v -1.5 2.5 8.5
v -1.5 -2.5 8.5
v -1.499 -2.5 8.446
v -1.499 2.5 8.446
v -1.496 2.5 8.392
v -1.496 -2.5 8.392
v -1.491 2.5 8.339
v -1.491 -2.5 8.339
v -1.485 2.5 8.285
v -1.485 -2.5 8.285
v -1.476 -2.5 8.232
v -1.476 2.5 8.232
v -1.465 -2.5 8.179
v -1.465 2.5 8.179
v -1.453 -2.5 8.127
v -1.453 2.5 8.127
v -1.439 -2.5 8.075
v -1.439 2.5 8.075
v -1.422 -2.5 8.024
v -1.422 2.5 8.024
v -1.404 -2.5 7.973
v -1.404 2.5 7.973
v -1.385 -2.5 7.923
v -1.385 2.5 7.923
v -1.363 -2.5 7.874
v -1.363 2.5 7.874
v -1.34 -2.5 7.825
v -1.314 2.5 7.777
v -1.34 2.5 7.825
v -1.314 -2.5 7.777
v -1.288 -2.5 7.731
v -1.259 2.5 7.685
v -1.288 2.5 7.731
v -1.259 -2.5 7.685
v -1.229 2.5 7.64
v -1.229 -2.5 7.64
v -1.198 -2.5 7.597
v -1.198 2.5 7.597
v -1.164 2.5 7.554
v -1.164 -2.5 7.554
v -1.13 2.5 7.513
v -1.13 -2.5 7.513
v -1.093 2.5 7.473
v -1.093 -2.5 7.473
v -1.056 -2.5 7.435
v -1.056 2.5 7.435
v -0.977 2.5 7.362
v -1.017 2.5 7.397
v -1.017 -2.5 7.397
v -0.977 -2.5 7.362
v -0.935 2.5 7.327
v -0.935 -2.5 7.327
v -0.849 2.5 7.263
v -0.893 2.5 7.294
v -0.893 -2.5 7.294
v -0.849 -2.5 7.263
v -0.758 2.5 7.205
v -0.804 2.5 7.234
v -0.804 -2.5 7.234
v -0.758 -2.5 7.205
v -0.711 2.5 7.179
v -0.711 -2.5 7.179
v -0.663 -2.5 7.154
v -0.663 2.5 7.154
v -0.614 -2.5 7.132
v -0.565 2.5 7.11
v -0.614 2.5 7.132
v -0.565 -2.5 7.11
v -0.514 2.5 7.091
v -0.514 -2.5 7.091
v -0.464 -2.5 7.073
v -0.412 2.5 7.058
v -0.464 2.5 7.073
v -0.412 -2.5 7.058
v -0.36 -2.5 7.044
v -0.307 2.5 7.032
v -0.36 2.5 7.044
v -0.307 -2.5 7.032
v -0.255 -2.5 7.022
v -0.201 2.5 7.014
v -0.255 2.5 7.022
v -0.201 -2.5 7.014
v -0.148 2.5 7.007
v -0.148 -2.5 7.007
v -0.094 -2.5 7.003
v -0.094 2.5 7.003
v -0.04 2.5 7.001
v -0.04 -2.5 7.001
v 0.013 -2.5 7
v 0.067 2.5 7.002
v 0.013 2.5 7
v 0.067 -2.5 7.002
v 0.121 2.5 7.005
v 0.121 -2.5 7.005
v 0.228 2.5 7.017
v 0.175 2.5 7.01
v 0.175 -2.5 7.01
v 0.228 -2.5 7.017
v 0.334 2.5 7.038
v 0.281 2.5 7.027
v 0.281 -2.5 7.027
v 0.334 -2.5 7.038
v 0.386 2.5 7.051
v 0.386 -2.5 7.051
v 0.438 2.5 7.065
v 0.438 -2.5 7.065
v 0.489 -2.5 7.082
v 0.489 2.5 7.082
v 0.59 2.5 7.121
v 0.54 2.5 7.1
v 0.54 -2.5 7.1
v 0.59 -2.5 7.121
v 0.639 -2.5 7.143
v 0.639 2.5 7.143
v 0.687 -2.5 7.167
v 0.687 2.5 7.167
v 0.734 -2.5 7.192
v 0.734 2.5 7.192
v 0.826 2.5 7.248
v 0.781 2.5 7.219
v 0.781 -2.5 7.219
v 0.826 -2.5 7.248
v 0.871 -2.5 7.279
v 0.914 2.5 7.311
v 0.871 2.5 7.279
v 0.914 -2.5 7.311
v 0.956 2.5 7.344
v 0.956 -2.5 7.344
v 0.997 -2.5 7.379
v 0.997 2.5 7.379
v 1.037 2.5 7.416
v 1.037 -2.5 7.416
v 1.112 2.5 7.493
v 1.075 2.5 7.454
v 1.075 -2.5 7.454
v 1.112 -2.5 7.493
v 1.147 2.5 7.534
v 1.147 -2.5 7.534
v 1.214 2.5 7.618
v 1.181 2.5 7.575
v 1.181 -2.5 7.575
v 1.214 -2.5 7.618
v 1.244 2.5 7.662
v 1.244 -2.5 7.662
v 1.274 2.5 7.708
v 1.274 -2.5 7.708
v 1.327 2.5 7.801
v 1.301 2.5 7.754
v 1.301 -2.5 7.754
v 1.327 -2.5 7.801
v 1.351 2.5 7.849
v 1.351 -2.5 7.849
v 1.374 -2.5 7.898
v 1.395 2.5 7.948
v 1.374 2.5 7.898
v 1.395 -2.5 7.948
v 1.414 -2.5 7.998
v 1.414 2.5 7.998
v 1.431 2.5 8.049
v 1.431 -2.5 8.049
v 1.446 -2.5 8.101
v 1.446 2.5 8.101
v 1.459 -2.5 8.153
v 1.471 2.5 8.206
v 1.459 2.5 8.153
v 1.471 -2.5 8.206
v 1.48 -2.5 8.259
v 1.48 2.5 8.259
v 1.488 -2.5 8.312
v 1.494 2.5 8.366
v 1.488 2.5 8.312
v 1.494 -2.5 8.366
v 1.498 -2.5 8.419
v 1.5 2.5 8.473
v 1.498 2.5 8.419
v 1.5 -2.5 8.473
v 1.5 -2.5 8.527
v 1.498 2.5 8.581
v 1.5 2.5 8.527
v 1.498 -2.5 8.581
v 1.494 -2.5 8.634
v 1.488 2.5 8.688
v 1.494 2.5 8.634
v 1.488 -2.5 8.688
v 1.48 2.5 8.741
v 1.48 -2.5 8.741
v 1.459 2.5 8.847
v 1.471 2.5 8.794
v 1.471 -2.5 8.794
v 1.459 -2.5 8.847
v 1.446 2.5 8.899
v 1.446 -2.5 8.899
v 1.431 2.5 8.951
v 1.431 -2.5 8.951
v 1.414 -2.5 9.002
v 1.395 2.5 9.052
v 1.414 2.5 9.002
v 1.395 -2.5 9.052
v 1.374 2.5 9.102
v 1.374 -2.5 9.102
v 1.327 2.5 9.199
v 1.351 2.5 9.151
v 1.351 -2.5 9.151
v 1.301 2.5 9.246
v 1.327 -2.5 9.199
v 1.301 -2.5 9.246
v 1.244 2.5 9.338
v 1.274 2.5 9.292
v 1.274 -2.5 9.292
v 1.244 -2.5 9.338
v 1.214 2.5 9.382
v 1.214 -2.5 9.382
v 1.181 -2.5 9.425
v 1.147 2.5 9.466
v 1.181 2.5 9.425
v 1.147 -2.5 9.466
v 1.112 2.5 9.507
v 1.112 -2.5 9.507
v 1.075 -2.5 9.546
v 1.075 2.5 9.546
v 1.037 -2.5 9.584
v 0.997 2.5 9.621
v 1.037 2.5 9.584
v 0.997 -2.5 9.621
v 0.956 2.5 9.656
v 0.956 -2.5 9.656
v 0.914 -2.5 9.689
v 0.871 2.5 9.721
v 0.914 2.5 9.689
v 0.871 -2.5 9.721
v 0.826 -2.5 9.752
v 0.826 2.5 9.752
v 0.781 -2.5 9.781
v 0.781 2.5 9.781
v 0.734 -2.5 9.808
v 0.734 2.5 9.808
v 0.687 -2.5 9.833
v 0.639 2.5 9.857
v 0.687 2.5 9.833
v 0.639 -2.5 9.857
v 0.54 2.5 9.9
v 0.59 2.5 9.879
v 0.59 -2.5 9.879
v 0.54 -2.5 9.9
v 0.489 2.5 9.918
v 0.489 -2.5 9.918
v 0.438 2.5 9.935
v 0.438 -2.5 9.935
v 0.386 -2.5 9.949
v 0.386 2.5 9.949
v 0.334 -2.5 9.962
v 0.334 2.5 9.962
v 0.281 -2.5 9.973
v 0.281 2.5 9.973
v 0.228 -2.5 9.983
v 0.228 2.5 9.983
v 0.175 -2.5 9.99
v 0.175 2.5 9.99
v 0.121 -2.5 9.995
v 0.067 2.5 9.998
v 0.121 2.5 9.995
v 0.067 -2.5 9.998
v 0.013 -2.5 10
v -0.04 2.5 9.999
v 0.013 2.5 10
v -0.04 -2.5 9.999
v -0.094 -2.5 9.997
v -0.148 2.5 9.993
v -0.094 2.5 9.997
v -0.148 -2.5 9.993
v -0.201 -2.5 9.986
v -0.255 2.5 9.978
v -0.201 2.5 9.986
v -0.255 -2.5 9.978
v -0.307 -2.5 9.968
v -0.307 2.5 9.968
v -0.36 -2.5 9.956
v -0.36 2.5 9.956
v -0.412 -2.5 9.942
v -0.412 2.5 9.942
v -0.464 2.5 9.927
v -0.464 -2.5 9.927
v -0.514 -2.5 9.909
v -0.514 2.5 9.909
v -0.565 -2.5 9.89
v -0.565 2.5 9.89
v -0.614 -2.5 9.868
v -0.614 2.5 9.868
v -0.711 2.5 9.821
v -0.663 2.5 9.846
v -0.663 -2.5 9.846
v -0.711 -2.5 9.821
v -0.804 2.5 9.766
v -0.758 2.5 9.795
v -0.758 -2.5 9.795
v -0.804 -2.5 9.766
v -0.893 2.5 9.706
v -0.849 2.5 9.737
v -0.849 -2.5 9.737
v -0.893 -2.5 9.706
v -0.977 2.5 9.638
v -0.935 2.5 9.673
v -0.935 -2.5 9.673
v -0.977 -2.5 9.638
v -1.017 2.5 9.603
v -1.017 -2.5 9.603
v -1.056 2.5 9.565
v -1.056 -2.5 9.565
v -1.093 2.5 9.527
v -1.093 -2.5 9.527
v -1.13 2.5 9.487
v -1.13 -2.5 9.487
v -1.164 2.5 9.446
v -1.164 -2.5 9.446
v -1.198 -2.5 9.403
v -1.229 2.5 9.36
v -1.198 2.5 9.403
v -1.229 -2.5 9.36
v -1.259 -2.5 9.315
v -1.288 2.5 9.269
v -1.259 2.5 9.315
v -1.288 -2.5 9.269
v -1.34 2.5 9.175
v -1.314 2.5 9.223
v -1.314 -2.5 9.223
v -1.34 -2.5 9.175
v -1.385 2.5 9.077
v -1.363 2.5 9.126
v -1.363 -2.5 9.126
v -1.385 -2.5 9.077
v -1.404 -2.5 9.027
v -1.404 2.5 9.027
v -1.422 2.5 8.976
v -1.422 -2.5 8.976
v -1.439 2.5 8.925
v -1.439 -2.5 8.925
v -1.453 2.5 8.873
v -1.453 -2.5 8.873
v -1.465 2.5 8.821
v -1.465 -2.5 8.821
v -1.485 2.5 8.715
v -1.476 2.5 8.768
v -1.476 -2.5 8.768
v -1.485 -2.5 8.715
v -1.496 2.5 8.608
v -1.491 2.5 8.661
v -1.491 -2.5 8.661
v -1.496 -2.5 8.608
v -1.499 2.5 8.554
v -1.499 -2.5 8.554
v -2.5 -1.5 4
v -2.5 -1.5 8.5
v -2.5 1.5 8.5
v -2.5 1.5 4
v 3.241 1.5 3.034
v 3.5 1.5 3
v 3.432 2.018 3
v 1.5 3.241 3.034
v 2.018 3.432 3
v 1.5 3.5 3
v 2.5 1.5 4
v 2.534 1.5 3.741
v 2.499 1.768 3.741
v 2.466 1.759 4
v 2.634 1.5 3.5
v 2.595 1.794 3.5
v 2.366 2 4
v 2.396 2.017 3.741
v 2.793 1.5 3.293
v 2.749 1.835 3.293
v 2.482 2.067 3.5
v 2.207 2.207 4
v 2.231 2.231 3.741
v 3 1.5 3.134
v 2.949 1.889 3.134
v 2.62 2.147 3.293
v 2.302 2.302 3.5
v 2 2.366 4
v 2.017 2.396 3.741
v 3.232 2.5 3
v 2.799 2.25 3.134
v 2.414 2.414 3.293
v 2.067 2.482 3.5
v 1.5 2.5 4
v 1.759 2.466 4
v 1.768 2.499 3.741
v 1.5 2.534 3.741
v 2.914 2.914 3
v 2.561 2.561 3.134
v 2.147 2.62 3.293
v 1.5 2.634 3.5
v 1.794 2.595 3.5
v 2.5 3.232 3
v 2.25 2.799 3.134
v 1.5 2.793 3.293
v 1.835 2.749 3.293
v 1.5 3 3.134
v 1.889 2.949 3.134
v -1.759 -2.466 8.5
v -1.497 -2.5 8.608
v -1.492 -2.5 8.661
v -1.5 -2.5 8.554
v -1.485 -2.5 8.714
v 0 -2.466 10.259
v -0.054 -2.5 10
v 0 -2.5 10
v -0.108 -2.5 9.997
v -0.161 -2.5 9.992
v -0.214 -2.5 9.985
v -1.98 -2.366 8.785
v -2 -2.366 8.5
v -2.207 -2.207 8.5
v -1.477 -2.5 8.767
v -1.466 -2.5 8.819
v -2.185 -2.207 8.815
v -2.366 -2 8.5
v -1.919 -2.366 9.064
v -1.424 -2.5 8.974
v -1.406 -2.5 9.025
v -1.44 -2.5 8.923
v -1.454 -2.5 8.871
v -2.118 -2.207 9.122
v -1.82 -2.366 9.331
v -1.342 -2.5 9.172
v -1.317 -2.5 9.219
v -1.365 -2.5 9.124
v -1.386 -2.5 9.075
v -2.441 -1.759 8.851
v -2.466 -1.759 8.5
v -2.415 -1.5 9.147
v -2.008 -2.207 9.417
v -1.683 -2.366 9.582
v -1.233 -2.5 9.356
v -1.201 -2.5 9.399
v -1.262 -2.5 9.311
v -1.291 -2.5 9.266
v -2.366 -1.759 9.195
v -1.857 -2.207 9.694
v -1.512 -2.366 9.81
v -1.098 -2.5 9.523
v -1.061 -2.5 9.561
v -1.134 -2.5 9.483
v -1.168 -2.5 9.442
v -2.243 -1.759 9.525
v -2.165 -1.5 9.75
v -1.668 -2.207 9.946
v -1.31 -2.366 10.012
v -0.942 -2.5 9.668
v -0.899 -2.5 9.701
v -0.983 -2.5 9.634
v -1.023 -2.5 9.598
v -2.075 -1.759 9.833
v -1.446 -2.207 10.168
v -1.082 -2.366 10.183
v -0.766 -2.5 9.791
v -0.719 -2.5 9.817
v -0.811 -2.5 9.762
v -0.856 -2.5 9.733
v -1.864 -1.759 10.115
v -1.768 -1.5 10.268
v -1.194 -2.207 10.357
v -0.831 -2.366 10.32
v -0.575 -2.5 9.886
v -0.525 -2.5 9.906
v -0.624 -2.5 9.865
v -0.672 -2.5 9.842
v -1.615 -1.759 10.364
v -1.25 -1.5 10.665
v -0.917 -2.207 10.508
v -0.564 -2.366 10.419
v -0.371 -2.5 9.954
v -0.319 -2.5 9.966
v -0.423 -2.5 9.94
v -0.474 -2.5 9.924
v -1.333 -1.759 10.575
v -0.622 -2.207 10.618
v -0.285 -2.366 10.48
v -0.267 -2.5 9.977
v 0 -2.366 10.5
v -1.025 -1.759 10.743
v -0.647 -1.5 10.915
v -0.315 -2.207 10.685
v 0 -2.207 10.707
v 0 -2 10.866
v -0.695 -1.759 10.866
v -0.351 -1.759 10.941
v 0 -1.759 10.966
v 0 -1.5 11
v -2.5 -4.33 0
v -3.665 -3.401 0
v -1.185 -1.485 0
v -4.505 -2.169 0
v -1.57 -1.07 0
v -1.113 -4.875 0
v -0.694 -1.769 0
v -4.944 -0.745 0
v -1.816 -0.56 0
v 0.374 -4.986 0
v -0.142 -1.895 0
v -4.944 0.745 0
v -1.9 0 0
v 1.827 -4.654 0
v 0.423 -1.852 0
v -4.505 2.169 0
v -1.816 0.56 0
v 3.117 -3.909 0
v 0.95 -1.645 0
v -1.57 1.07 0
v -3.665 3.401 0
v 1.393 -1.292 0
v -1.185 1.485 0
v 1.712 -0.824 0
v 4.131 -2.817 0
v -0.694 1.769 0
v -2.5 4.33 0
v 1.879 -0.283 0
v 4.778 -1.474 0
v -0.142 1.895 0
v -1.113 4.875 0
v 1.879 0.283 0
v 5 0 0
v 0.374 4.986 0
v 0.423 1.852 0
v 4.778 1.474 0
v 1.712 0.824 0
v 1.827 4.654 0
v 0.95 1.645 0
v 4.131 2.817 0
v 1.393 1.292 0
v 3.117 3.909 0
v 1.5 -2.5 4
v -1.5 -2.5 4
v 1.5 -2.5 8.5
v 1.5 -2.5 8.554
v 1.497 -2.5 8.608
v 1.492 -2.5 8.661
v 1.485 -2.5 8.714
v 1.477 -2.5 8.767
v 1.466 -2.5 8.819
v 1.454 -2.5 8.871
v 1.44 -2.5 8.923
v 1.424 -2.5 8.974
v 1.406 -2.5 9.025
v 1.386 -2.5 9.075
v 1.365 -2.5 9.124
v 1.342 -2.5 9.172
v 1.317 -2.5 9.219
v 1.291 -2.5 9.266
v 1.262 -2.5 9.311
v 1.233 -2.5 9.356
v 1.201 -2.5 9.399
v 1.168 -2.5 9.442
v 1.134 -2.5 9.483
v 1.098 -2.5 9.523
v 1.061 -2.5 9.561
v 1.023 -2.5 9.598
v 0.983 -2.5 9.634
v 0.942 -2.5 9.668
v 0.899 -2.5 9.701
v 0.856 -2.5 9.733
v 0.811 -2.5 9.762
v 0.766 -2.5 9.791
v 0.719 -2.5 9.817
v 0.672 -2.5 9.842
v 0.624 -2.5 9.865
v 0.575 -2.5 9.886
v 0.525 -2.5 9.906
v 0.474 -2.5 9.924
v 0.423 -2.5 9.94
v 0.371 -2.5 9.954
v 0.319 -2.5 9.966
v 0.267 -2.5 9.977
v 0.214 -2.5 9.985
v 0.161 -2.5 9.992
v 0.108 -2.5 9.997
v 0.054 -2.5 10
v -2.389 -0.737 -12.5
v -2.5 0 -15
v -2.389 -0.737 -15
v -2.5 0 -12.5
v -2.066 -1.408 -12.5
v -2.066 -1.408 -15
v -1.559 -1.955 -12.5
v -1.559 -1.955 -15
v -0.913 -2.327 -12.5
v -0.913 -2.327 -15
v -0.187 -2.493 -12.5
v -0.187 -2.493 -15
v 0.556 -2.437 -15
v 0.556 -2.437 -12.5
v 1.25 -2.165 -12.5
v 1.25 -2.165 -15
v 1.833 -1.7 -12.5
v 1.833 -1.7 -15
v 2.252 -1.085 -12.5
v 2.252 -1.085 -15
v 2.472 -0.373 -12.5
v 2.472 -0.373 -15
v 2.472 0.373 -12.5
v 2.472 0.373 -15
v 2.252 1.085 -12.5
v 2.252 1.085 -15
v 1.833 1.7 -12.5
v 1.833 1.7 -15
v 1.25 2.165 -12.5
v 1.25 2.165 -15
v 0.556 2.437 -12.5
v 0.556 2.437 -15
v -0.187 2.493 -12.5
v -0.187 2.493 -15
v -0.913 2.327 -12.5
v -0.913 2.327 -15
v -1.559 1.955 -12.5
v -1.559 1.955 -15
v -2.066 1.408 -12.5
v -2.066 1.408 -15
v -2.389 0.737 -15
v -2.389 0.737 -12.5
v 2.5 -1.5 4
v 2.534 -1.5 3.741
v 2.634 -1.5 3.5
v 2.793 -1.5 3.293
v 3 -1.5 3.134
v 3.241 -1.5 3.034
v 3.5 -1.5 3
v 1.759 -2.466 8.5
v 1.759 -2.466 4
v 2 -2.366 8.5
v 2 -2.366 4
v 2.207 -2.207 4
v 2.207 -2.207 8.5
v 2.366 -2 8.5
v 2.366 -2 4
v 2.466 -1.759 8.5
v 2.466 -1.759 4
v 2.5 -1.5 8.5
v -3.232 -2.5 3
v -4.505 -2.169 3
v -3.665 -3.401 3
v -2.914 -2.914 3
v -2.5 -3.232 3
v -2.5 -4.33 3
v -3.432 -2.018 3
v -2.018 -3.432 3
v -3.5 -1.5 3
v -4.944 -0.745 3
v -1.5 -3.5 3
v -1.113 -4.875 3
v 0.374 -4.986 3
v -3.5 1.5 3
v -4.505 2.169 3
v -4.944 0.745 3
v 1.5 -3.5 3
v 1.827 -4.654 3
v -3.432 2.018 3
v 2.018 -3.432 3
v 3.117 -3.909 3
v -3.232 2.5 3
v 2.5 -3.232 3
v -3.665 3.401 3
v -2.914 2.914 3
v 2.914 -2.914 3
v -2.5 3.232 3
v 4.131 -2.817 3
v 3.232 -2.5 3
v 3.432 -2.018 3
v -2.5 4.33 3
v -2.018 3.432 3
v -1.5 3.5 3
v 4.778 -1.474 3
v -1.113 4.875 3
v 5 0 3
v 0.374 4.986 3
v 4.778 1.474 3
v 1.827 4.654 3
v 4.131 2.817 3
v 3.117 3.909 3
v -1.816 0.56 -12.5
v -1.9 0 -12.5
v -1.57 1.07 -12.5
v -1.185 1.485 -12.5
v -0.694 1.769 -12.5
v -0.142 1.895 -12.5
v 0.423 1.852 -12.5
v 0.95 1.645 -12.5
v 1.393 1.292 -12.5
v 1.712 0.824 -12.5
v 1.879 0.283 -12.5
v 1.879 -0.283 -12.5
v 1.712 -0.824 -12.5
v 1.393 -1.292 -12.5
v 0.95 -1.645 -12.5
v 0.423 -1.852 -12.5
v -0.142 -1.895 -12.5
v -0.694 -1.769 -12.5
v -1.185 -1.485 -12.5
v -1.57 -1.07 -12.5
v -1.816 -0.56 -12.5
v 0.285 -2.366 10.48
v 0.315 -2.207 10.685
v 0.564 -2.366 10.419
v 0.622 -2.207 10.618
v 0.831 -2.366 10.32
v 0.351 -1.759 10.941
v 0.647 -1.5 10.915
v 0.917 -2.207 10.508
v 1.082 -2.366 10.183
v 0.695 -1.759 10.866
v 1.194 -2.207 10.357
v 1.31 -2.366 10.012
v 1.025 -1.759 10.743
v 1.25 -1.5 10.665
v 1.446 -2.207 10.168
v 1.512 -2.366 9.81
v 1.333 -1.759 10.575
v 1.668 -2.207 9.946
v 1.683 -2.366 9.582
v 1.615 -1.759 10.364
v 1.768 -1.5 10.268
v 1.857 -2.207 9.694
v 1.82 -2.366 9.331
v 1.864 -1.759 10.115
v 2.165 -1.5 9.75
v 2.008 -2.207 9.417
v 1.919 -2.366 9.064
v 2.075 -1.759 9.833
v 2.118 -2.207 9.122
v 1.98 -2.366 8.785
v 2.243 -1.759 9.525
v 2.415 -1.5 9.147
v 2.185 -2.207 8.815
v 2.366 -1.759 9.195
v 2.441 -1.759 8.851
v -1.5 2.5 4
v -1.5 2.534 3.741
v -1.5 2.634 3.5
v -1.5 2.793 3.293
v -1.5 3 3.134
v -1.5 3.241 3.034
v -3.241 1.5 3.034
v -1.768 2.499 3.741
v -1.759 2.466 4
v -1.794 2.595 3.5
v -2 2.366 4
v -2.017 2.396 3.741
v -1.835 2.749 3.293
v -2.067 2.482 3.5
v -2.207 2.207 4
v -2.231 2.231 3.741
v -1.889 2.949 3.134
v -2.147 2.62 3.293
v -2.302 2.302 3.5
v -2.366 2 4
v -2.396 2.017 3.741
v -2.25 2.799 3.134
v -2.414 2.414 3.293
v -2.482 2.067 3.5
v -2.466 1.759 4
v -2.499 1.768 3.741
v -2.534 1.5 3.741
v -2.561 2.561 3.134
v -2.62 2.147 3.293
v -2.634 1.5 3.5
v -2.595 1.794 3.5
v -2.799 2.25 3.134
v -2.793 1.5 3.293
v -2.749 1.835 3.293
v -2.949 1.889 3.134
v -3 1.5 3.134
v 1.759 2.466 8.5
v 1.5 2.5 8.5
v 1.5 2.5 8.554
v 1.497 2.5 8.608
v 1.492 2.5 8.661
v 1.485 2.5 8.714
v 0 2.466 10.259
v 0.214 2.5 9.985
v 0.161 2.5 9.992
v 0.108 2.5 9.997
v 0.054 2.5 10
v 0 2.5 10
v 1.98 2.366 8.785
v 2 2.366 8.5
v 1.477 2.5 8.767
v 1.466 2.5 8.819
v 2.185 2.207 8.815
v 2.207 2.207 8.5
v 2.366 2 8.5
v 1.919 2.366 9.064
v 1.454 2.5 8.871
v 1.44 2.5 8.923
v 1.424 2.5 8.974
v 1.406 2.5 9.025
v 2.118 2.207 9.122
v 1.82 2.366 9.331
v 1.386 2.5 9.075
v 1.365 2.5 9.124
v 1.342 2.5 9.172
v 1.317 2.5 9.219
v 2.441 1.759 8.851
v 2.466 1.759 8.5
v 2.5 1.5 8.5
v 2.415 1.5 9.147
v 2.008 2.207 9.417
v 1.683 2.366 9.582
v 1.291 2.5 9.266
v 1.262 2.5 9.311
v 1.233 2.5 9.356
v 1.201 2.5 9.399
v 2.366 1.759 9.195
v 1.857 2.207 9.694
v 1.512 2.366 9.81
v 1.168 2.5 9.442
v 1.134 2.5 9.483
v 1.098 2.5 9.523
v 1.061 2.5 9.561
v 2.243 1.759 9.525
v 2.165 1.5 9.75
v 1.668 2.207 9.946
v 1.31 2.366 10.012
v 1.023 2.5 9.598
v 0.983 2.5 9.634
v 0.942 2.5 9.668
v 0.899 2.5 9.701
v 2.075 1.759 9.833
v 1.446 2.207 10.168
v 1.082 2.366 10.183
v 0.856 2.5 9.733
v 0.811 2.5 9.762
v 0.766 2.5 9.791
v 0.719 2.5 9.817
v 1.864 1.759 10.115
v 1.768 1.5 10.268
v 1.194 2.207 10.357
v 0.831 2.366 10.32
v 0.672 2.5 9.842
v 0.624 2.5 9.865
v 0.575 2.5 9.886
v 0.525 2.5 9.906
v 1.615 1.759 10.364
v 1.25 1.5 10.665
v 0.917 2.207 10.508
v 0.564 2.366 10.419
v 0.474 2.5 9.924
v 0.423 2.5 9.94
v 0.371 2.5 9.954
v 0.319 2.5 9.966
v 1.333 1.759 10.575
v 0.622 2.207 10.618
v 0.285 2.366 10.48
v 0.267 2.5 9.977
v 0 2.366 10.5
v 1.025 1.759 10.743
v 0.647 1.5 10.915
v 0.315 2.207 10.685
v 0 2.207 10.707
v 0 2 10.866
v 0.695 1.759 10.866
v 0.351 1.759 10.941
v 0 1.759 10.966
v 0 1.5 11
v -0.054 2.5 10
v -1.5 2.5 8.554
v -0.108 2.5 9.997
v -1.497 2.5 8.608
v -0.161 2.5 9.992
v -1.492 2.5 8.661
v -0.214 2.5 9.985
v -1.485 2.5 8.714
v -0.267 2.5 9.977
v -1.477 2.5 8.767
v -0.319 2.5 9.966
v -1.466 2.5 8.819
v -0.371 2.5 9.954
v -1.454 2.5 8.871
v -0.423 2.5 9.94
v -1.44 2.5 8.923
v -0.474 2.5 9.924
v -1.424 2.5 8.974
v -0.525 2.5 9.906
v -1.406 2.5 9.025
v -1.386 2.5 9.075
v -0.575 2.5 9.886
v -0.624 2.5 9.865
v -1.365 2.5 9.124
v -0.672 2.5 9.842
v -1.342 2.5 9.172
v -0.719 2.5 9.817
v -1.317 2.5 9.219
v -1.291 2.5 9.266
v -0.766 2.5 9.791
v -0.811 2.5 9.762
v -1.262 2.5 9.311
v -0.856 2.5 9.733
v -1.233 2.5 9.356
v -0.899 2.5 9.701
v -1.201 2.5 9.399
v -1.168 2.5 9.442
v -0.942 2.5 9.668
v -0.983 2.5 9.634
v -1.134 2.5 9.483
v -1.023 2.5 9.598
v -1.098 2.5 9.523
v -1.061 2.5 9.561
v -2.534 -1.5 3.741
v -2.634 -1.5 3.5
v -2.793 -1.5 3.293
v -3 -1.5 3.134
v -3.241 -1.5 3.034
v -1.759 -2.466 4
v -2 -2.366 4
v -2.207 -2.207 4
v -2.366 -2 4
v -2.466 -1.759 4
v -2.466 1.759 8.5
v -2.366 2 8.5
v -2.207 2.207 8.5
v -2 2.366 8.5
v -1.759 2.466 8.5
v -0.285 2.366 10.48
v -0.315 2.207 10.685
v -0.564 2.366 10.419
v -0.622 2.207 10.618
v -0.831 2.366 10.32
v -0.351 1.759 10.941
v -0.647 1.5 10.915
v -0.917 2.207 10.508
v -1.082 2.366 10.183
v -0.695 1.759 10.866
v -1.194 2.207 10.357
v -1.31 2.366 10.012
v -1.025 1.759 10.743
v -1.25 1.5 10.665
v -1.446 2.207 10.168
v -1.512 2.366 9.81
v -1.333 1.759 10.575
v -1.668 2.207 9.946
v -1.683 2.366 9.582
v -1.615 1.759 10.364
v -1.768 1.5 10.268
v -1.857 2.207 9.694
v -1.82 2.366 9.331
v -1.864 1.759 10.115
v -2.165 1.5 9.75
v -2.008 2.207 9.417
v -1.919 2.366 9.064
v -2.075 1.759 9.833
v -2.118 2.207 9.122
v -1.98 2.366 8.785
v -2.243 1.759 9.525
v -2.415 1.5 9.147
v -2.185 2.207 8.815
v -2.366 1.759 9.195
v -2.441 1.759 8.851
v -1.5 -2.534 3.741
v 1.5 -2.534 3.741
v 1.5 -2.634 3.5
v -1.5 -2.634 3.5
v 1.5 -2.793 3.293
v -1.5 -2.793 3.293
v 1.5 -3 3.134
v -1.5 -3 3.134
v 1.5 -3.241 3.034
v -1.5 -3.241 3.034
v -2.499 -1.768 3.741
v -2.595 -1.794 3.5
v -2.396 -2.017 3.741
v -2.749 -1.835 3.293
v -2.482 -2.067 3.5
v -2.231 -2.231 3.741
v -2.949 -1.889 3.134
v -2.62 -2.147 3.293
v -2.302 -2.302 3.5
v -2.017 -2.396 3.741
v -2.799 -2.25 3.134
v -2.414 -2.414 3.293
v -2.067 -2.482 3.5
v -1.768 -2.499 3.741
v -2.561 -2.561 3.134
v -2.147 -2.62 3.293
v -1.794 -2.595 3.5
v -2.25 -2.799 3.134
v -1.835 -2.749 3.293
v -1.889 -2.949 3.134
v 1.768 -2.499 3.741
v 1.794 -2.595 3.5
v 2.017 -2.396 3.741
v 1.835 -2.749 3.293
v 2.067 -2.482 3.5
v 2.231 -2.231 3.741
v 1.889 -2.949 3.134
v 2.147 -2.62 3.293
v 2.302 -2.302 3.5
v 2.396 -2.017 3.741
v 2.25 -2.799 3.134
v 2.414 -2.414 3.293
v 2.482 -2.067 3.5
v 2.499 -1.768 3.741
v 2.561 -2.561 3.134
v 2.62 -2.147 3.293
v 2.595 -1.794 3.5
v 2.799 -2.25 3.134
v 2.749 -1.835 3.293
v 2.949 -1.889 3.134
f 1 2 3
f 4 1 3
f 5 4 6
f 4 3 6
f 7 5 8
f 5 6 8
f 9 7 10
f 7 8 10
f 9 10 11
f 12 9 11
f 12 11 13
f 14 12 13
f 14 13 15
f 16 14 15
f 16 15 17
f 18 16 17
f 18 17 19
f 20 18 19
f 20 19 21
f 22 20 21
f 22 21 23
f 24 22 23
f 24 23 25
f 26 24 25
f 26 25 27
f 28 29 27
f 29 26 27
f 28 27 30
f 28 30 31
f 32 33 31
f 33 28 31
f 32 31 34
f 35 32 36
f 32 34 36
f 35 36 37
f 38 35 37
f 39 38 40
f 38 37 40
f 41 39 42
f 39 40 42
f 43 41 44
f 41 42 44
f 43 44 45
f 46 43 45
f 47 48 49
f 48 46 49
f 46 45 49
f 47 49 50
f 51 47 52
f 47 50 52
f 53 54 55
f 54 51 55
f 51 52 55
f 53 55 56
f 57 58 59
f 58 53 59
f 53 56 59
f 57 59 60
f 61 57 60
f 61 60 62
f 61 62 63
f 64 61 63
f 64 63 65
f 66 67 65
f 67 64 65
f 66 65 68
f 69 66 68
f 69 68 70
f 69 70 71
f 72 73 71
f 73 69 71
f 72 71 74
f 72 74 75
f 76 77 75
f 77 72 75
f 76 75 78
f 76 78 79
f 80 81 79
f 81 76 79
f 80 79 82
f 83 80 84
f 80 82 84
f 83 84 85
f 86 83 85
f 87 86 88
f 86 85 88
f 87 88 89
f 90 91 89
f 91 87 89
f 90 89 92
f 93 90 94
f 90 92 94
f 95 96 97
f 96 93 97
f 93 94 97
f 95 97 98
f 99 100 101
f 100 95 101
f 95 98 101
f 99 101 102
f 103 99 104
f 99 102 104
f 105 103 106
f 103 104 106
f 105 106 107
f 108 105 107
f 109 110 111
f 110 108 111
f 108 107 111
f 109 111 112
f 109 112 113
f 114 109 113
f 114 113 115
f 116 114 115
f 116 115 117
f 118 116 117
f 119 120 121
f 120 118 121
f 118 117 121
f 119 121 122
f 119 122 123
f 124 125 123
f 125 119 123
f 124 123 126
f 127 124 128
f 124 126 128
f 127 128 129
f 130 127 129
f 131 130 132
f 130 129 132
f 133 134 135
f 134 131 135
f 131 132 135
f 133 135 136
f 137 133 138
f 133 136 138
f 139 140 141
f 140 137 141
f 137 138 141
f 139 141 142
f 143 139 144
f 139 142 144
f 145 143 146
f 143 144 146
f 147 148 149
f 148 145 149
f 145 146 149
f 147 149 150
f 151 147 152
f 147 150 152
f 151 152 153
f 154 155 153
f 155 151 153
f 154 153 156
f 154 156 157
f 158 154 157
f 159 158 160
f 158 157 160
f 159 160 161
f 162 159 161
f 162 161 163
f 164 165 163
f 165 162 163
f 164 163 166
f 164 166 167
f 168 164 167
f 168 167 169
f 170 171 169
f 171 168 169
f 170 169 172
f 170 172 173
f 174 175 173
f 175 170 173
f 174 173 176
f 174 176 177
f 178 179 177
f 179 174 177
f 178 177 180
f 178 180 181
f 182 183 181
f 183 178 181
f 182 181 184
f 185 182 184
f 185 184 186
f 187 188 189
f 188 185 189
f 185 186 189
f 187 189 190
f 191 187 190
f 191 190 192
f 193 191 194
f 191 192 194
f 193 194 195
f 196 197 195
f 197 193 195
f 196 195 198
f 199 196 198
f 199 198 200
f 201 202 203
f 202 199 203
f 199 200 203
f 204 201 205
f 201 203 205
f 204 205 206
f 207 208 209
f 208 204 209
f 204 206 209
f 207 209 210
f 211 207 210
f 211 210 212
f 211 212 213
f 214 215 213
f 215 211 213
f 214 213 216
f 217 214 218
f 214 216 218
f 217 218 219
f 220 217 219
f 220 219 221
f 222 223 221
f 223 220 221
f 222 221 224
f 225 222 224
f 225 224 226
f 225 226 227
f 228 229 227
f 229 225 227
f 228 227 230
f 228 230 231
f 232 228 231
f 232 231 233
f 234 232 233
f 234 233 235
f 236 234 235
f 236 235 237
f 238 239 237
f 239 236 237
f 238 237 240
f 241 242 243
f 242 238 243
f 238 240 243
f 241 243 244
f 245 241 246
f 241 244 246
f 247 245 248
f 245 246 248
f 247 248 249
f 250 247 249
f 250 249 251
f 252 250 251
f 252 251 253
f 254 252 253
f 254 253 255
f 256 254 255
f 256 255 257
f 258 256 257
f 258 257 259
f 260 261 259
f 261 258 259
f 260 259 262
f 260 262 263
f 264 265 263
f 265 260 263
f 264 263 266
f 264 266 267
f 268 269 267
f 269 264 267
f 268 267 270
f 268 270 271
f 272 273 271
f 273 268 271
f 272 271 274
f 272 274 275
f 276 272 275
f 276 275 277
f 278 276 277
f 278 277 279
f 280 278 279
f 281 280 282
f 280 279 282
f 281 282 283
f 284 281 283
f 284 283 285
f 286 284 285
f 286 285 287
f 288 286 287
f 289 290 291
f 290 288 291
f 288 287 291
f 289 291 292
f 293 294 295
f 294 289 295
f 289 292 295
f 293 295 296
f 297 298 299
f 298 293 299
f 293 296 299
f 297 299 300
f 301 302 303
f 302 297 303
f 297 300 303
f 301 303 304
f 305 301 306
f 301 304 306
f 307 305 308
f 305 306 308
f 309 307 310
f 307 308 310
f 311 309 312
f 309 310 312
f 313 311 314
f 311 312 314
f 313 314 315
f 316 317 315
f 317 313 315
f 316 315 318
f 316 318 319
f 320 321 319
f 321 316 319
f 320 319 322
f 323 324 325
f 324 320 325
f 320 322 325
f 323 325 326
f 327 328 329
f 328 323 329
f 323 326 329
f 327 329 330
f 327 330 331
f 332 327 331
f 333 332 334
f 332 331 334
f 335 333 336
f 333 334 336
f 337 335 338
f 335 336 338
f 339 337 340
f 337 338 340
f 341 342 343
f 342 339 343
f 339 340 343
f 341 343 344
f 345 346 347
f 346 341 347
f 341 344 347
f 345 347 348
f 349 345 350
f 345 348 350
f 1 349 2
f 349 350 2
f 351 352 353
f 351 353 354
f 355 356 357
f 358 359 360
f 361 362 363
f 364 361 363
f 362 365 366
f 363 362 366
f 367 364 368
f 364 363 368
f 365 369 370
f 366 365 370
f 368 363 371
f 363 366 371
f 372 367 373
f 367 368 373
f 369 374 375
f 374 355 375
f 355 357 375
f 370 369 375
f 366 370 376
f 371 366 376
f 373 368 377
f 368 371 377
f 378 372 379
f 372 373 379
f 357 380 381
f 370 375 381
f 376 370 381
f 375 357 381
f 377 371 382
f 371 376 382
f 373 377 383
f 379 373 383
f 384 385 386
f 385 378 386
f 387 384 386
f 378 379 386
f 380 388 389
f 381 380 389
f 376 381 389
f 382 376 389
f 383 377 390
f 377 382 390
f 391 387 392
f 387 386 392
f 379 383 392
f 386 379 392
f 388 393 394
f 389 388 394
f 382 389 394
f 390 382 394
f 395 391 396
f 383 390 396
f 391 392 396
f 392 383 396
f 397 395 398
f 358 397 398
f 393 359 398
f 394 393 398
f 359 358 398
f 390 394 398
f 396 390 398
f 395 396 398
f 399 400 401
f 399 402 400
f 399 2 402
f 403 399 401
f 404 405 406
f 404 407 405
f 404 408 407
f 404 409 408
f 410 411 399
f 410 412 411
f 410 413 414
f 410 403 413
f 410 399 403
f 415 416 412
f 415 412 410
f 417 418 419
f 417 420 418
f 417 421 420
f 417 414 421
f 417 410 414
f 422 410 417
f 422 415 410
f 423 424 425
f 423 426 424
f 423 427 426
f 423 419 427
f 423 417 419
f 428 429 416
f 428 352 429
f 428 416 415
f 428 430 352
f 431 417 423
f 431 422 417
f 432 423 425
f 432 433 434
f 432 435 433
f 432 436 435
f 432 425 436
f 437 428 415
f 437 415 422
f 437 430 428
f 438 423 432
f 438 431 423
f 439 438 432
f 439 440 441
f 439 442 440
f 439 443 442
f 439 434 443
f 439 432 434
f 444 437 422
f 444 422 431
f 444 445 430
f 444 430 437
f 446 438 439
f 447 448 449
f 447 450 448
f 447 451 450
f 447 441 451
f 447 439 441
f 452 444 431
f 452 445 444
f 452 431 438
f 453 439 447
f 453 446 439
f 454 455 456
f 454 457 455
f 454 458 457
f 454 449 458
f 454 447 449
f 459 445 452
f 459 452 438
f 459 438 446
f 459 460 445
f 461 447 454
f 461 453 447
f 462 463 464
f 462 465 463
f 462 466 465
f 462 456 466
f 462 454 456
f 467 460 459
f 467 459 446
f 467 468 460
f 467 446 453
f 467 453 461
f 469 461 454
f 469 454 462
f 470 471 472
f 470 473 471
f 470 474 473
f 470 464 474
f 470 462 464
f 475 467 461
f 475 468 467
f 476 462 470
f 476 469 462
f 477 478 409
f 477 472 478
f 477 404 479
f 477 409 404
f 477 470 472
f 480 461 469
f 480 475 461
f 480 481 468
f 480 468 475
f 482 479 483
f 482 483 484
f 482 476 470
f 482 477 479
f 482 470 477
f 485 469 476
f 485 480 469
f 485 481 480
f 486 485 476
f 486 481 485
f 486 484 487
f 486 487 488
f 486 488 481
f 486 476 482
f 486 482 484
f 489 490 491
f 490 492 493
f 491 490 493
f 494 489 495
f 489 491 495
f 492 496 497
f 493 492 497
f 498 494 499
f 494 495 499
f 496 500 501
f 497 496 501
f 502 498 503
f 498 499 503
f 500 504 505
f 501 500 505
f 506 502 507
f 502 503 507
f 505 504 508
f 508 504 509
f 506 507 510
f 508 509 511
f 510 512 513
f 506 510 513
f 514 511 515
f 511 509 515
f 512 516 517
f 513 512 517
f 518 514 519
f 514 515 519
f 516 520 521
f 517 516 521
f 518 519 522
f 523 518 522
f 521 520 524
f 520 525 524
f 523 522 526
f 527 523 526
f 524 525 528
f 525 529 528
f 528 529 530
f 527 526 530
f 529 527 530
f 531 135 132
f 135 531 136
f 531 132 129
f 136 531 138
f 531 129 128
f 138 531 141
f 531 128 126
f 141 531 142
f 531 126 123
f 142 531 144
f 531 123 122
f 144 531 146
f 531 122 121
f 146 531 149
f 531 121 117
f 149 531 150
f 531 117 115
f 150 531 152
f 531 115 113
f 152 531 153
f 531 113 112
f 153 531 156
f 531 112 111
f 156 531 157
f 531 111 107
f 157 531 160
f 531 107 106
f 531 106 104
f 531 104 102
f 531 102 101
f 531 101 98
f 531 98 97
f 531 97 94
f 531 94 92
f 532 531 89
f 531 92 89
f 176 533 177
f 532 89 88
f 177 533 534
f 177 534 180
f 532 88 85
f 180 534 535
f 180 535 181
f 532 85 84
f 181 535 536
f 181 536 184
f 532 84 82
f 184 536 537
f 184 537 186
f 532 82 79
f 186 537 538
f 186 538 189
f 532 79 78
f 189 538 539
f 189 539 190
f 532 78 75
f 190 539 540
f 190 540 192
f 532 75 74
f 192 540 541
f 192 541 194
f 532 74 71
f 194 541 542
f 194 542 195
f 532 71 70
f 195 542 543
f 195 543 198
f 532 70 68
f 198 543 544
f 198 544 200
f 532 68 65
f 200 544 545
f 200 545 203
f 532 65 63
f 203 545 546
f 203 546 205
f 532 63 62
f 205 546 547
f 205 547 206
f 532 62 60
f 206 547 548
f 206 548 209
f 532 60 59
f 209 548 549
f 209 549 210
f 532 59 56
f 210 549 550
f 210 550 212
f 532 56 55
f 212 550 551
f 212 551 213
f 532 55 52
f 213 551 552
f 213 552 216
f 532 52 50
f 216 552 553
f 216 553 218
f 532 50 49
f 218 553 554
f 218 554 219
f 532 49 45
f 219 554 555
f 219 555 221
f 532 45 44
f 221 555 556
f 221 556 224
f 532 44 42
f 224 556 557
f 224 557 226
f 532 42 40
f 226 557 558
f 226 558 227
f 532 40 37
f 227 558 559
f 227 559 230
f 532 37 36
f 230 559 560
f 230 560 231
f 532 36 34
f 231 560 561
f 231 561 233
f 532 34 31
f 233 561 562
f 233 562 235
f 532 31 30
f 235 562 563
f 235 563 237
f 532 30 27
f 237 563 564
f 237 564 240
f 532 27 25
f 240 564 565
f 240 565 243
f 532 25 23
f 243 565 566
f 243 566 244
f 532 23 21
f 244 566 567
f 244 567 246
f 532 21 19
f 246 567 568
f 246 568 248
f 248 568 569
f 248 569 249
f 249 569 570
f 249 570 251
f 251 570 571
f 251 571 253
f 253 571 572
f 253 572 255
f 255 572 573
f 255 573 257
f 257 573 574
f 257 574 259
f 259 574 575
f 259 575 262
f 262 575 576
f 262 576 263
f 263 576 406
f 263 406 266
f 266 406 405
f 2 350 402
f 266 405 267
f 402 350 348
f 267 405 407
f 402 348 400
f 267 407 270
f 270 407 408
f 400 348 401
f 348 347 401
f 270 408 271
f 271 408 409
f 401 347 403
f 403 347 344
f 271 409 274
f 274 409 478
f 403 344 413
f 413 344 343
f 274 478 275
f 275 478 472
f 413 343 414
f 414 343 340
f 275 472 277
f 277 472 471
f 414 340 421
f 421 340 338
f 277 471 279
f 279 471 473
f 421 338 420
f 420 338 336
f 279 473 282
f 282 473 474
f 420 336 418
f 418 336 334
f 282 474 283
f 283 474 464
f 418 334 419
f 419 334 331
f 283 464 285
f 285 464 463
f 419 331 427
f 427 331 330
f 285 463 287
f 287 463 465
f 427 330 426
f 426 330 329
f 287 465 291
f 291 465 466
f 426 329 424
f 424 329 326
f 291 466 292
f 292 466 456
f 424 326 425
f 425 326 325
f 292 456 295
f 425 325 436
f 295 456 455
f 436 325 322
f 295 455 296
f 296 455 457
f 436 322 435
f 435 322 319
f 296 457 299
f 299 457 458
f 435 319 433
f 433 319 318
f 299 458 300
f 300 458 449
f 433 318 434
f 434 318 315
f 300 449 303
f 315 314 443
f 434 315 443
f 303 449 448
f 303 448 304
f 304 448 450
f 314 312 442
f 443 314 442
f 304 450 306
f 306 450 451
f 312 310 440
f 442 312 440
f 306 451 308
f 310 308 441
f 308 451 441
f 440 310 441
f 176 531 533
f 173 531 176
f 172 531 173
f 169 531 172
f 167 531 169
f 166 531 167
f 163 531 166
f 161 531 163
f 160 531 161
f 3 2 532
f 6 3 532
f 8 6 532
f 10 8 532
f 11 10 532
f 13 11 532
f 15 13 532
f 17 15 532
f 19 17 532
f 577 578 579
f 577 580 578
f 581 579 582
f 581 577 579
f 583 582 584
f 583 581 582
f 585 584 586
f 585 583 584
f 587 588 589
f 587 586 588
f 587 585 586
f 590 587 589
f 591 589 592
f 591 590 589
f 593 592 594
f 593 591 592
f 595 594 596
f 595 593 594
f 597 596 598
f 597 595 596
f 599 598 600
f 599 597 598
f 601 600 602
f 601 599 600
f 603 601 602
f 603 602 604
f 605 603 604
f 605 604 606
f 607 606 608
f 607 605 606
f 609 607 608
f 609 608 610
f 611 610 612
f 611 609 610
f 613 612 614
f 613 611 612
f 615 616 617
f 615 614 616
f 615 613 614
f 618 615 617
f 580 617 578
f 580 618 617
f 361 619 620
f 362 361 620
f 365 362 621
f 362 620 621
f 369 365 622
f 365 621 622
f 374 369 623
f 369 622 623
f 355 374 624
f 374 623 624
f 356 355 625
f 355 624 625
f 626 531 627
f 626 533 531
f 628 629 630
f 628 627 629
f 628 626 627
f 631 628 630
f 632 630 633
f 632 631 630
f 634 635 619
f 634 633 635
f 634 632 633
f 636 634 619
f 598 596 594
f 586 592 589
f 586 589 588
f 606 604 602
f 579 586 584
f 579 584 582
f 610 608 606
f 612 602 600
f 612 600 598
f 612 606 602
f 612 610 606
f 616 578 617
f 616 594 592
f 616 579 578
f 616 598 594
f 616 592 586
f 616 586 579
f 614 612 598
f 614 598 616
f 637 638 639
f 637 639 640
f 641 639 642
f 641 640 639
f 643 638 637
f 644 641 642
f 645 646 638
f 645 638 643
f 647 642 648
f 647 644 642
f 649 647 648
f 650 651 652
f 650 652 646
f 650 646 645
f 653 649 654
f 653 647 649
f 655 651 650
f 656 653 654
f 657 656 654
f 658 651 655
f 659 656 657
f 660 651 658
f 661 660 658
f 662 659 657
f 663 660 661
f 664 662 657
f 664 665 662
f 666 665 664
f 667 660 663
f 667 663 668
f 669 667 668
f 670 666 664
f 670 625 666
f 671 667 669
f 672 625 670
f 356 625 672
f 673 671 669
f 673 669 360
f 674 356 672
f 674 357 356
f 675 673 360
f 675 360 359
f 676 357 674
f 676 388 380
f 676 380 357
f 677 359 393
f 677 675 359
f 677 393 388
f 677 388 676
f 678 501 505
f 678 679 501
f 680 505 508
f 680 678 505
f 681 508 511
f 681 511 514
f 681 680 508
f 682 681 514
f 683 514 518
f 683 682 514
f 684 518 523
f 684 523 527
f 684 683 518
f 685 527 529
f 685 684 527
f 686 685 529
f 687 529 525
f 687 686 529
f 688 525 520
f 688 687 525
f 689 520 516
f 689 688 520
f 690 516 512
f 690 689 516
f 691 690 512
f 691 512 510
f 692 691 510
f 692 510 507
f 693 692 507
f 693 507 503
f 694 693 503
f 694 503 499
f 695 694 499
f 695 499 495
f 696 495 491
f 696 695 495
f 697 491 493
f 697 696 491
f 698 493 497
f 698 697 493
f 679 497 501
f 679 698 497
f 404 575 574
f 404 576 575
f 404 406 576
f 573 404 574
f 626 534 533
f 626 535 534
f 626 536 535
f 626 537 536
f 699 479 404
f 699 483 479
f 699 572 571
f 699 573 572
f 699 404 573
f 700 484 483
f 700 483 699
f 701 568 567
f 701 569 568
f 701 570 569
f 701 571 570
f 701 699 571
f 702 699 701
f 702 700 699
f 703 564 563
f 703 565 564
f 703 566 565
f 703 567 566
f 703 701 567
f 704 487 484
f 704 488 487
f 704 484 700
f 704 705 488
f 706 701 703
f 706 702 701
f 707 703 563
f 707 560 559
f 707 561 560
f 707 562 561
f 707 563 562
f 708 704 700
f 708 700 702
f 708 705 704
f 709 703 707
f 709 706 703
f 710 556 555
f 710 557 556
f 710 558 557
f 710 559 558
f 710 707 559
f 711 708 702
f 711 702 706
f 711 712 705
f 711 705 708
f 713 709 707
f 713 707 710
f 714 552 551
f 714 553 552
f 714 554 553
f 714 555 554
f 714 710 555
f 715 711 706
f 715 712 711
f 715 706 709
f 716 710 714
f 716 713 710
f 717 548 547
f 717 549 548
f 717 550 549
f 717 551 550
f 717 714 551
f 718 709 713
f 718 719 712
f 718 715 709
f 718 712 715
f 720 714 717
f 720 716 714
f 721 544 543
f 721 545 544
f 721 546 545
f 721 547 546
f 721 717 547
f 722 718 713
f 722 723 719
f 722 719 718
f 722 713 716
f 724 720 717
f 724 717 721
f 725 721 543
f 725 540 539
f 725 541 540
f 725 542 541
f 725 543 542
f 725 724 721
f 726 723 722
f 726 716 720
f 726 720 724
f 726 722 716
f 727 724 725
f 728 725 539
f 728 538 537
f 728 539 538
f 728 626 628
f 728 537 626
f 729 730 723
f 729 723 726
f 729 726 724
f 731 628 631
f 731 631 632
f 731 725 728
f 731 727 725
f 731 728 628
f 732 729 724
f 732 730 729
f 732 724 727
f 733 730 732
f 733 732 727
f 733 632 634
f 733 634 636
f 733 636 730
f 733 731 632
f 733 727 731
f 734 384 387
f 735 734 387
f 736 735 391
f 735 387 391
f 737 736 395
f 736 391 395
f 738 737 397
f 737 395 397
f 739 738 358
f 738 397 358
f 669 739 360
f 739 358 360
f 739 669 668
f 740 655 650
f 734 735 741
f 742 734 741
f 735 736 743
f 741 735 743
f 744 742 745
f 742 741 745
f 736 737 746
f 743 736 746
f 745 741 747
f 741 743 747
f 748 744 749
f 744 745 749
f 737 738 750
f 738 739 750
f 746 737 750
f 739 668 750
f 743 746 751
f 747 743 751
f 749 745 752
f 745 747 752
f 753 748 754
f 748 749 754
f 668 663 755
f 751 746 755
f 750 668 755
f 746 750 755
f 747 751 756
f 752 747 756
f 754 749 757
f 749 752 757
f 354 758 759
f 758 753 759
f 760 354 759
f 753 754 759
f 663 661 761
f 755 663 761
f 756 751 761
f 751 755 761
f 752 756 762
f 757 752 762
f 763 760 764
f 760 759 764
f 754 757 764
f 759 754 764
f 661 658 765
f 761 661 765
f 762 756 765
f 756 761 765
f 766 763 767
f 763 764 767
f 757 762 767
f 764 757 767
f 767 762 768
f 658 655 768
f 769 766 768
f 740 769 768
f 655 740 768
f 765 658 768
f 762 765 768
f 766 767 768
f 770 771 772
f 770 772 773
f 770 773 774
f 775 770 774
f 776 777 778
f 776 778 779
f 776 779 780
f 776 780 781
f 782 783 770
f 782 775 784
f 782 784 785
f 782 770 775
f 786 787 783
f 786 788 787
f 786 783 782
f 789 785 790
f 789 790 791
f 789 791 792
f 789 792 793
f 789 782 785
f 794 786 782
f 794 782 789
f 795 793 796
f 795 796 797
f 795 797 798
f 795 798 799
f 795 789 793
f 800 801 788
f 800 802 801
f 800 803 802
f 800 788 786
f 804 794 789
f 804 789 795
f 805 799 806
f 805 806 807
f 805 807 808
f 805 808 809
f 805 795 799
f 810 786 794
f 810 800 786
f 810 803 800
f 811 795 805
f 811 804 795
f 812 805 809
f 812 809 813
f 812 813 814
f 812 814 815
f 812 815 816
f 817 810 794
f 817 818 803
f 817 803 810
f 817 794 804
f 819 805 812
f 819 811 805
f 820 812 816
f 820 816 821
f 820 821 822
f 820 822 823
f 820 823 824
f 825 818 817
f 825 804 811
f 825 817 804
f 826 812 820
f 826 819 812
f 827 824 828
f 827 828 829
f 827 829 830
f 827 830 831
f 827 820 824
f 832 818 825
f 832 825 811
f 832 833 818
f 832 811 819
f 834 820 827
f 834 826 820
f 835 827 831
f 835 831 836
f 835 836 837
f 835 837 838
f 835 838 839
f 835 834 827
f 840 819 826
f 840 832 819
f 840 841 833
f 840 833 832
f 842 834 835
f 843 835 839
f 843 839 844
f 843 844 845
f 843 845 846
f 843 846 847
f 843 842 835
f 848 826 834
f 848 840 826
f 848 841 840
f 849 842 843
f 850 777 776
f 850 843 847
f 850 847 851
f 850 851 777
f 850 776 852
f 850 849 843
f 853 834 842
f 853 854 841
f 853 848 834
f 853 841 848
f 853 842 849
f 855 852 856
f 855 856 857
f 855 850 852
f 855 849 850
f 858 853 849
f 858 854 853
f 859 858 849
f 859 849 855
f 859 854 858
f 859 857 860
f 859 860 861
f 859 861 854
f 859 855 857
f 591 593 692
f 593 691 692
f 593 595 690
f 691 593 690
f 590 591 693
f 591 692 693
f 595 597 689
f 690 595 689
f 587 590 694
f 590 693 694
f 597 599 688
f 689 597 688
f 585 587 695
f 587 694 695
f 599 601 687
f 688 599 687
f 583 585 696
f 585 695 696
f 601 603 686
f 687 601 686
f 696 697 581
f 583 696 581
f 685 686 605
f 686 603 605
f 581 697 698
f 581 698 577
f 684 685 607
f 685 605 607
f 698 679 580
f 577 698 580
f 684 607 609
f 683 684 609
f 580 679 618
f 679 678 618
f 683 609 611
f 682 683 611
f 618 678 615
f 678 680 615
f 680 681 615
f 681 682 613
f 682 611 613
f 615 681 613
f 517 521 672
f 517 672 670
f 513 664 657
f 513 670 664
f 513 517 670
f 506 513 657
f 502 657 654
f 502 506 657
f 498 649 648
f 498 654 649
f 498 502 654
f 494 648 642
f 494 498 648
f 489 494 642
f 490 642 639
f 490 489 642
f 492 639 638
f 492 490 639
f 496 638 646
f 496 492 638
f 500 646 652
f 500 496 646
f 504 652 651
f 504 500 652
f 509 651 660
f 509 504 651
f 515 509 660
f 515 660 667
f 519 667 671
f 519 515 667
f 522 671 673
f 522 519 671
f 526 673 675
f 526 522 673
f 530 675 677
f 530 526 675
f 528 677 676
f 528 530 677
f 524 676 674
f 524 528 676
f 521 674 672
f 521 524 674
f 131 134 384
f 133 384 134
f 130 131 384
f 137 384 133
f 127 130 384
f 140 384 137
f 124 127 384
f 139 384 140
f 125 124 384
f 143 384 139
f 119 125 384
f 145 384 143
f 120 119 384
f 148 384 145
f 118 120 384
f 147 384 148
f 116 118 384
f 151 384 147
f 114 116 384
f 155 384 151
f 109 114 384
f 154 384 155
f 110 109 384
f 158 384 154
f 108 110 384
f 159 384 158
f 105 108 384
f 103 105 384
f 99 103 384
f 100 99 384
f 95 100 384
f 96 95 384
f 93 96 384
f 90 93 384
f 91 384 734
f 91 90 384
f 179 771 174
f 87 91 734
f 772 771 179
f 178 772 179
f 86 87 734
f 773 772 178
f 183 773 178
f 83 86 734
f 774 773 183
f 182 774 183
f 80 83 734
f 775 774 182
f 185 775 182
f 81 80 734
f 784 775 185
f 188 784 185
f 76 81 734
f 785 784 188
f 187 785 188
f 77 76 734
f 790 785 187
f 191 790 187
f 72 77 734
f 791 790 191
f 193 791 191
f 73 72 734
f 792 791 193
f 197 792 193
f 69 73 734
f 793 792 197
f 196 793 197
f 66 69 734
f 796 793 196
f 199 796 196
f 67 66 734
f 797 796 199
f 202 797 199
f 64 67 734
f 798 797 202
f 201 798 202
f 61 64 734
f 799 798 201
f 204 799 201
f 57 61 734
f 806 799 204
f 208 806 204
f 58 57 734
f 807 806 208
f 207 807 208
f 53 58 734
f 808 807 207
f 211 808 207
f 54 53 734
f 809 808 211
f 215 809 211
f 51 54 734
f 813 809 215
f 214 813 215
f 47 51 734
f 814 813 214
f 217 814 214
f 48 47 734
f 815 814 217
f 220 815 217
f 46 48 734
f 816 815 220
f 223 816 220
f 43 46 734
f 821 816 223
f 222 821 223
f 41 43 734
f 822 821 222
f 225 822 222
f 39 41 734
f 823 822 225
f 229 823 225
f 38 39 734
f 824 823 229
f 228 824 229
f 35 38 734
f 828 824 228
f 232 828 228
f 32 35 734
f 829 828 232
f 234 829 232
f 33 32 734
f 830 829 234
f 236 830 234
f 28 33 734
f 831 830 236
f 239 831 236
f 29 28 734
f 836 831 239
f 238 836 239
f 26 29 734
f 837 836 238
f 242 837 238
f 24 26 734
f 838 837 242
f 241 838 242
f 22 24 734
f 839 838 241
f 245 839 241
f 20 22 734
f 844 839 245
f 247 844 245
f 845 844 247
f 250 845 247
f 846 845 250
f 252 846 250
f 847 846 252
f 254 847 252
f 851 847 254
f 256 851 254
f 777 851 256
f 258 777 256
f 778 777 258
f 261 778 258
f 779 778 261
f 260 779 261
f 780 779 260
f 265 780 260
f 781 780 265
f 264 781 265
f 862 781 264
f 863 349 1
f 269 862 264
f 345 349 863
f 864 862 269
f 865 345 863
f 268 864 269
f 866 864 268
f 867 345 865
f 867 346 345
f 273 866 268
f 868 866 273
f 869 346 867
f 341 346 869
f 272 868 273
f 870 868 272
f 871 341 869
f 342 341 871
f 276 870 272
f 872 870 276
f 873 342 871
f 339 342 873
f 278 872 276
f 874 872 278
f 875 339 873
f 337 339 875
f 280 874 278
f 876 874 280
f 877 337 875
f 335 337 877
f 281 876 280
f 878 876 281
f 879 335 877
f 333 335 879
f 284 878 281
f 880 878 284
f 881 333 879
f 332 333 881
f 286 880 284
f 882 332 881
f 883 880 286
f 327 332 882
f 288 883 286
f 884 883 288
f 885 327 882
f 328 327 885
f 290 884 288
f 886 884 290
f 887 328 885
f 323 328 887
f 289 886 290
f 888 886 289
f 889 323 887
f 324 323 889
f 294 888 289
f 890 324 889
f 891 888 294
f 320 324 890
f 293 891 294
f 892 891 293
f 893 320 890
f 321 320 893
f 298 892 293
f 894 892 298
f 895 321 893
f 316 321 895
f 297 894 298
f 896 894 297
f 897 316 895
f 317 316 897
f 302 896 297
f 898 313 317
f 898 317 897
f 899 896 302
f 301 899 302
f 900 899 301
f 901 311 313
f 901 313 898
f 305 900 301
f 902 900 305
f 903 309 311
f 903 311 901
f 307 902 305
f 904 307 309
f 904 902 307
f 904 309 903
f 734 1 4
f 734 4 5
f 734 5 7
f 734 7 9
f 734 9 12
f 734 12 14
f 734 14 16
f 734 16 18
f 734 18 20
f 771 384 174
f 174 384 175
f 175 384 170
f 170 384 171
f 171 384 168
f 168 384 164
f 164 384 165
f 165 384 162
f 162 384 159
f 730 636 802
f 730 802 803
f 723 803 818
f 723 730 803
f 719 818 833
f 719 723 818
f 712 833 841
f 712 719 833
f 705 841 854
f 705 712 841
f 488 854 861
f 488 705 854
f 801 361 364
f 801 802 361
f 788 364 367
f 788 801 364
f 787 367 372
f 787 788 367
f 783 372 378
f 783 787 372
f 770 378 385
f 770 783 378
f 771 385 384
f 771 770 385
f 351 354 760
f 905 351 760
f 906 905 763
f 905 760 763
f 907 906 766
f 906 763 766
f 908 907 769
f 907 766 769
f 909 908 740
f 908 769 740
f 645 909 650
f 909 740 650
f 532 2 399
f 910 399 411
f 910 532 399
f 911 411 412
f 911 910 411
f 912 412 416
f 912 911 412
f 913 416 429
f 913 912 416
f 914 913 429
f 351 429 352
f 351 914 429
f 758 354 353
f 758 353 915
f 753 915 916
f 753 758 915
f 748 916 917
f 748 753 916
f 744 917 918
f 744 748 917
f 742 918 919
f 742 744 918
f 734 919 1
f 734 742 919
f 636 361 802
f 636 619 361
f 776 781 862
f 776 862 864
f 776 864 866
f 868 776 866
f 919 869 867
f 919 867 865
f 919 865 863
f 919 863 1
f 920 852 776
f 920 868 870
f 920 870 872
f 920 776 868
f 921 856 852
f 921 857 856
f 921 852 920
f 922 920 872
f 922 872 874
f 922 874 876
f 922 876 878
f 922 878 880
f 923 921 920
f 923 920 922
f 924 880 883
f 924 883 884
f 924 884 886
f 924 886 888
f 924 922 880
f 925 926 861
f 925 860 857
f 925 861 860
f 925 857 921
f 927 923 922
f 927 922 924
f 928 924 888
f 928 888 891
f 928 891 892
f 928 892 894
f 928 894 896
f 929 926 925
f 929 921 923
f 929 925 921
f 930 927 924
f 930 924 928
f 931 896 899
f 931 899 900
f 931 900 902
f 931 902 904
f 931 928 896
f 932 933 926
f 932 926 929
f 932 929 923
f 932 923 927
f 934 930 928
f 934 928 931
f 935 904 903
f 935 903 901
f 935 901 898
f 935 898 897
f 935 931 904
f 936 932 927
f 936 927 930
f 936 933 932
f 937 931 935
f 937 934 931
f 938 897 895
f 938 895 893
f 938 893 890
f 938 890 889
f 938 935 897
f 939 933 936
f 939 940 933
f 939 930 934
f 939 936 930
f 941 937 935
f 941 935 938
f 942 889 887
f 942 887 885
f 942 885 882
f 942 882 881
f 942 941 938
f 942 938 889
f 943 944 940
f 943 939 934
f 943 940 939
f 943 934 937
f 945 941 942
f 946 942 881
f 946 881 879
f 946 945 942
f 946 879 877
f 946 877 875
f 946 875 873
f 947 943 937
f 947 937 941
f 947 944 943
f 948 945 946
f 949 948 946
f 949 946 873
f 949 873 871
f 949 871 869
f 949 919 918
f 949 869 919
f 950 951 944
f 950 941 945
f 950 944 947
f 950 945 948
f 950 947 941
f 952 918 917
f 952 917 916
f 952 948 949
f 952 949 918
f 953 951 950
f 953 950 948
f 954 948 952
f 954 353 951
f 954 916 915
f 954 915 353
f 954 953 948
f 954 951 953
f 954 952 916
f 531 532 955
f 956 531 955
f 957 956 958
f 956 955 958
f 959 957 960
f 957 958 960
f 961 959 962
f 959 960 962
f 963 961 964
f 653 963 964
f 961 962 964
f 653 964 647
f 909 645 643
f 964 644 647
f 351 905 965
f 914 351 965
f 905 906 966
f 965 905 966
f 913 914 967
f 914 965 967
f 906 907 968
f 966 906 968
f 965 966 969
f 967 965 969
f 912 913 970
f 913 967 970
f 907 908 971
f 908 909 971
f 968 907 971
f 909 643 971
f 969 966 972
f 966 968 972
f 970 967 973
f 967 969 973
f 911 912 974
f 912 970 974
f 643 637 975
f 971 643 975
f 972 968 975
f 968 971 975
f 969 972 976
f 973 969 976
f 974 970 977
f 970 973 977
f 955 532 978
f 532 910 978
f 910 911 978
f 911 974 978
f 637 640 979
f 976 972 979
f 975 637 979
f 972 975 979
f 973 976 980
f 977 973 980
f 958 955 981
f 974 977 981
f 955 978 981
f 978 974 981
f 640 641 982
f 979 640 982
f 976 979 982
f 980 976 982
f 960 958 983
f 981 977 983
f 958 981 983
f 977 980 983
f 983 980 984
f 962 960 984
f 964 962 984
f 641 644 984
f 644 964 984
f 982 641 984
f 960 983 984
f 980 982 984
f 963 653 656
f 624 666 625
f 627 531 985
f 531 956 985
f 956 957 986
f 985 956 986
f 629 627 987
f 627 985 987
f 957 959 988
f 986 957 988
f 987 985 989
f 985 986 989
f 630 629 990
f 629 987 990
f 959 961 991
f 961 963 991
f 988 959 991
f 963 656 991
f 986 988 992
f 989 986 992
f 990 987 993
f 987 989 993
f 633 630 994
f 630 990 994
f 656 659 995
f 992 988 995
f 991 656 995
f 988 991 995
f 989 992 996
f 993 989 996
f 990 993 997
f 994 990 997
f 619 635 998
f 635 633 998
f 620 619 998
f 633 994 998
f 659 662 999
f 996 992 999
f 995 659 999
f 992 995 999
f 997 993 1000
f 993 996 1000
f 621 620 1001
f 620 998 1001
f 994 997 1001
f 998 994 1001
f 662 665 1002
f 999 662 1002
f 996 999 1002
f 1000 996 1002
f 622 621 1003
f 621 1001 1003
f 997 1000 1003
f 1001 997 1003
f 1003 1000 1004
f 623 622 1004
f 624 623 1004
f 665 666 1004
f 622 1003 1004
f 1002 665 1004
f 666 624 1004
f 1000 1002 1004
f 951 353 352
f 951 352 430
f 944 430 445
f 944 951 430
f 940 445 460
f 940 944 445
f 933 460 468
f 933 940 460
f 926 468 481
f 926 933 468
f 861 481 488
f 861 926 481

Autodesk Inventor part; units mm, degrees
ref_plane "YZ Plane" through (0, 0, 0) normal (1, 0, 0) x (0, 1, 0)
sketch "스케치1" plane through (0, 0, 0) normal (0, 0, 1) x (1, 0, 0)
  circle A0 centre (0, 0) radius 5
  dimension "d0" = 10
extrude "돌출1" add sketch "스케치1" along normal blind 3
ref_plane "작업 평면1" through (0, 0, 0) normal (0, 1, 0) x (-1, 0, 0)
sketch "스케치2" plane through (0, 0, 0) normal (0, 1, 0) x (-1, 0, 0)
  line L0 (5, 3) -> (-5, 3) projected
  line L1 (2.5, 3) -> (-2.5, 3)
  line L2 (-2.5, 3) -> (-2.5, 11)
  line L3 (-2.5, 11) -> (2.5, 11)
  line L4 (2.5, 11) -> (2.5, 3)
  circle A0 centre (0, 8.5) radius 1.5
  point P0 (0, 0)
  point P1 (0, 3)
  point P2 (0, 11)
  dimension "d3" = 5
  dimension "d4" = 8
  dimension "d5" = 3
  dimension "d15" = 2.5
extrude "돌출2" add sketch "스케치2" along normal mid plane 5
fillet "모깎기1" radius 2.5 2 edges at (2.5, 0, 11) (-2.5, 0, 11)
fillet "모깎기2" radius 1 6 edges at (1.7679, 2.5, 10.2679) (2.5, 2.5, 5.7503) (-2.5, 2.5, 5.7503) (1.7679, -2.5, 10.2679) (2.5, -2.5, 5.7503) (-2.5, -2.5, 5.7503)
fillet "모깎기3" radius 1 8 edges at (-2.2073, -2.2073, 3) (-2.5, 0, 3) (-2.2073, 2.2073, 3) (0, 2.5, 3) (2.2073, 2.2073, 3) (2.5, 0, 3) (2.2073, -2.2073, 3) (0, -2.5, 3)
sketch "스케치3" plane through (0, 0, 0) normal (0, 0, -1) x (-1, 0, 0)
  circle A0 centre (0, 0) radius 4
  circle A1 centre (0, 0) radius 2.5
  dimension "d11" = 8
  dimension "d12" = 5
extrude "돌출3" add sketch "스케치3" along normal blind 15 contours A1
ref_plane "작업 평면2" through (0, 0, -12.5) normal (0, 0, -1) x (-1, 0, 0)
sketch "스케치4" plane through (0, 0, -12.5) normal (0, 0, -1) x (-1, 0, 0)
  circle A0 centre (0, 0) radius 1.9
  circle A1 centre (0, 0) radius 2.5 projected
  circle A2 centre (0, 0) radius 2.5 projected
  dimension "d17" = 3.8
extrude "돌출4" cut sketch "스케치4" against normal up to surface (12.5 mm away)
properties part number "SuspensionBase"
